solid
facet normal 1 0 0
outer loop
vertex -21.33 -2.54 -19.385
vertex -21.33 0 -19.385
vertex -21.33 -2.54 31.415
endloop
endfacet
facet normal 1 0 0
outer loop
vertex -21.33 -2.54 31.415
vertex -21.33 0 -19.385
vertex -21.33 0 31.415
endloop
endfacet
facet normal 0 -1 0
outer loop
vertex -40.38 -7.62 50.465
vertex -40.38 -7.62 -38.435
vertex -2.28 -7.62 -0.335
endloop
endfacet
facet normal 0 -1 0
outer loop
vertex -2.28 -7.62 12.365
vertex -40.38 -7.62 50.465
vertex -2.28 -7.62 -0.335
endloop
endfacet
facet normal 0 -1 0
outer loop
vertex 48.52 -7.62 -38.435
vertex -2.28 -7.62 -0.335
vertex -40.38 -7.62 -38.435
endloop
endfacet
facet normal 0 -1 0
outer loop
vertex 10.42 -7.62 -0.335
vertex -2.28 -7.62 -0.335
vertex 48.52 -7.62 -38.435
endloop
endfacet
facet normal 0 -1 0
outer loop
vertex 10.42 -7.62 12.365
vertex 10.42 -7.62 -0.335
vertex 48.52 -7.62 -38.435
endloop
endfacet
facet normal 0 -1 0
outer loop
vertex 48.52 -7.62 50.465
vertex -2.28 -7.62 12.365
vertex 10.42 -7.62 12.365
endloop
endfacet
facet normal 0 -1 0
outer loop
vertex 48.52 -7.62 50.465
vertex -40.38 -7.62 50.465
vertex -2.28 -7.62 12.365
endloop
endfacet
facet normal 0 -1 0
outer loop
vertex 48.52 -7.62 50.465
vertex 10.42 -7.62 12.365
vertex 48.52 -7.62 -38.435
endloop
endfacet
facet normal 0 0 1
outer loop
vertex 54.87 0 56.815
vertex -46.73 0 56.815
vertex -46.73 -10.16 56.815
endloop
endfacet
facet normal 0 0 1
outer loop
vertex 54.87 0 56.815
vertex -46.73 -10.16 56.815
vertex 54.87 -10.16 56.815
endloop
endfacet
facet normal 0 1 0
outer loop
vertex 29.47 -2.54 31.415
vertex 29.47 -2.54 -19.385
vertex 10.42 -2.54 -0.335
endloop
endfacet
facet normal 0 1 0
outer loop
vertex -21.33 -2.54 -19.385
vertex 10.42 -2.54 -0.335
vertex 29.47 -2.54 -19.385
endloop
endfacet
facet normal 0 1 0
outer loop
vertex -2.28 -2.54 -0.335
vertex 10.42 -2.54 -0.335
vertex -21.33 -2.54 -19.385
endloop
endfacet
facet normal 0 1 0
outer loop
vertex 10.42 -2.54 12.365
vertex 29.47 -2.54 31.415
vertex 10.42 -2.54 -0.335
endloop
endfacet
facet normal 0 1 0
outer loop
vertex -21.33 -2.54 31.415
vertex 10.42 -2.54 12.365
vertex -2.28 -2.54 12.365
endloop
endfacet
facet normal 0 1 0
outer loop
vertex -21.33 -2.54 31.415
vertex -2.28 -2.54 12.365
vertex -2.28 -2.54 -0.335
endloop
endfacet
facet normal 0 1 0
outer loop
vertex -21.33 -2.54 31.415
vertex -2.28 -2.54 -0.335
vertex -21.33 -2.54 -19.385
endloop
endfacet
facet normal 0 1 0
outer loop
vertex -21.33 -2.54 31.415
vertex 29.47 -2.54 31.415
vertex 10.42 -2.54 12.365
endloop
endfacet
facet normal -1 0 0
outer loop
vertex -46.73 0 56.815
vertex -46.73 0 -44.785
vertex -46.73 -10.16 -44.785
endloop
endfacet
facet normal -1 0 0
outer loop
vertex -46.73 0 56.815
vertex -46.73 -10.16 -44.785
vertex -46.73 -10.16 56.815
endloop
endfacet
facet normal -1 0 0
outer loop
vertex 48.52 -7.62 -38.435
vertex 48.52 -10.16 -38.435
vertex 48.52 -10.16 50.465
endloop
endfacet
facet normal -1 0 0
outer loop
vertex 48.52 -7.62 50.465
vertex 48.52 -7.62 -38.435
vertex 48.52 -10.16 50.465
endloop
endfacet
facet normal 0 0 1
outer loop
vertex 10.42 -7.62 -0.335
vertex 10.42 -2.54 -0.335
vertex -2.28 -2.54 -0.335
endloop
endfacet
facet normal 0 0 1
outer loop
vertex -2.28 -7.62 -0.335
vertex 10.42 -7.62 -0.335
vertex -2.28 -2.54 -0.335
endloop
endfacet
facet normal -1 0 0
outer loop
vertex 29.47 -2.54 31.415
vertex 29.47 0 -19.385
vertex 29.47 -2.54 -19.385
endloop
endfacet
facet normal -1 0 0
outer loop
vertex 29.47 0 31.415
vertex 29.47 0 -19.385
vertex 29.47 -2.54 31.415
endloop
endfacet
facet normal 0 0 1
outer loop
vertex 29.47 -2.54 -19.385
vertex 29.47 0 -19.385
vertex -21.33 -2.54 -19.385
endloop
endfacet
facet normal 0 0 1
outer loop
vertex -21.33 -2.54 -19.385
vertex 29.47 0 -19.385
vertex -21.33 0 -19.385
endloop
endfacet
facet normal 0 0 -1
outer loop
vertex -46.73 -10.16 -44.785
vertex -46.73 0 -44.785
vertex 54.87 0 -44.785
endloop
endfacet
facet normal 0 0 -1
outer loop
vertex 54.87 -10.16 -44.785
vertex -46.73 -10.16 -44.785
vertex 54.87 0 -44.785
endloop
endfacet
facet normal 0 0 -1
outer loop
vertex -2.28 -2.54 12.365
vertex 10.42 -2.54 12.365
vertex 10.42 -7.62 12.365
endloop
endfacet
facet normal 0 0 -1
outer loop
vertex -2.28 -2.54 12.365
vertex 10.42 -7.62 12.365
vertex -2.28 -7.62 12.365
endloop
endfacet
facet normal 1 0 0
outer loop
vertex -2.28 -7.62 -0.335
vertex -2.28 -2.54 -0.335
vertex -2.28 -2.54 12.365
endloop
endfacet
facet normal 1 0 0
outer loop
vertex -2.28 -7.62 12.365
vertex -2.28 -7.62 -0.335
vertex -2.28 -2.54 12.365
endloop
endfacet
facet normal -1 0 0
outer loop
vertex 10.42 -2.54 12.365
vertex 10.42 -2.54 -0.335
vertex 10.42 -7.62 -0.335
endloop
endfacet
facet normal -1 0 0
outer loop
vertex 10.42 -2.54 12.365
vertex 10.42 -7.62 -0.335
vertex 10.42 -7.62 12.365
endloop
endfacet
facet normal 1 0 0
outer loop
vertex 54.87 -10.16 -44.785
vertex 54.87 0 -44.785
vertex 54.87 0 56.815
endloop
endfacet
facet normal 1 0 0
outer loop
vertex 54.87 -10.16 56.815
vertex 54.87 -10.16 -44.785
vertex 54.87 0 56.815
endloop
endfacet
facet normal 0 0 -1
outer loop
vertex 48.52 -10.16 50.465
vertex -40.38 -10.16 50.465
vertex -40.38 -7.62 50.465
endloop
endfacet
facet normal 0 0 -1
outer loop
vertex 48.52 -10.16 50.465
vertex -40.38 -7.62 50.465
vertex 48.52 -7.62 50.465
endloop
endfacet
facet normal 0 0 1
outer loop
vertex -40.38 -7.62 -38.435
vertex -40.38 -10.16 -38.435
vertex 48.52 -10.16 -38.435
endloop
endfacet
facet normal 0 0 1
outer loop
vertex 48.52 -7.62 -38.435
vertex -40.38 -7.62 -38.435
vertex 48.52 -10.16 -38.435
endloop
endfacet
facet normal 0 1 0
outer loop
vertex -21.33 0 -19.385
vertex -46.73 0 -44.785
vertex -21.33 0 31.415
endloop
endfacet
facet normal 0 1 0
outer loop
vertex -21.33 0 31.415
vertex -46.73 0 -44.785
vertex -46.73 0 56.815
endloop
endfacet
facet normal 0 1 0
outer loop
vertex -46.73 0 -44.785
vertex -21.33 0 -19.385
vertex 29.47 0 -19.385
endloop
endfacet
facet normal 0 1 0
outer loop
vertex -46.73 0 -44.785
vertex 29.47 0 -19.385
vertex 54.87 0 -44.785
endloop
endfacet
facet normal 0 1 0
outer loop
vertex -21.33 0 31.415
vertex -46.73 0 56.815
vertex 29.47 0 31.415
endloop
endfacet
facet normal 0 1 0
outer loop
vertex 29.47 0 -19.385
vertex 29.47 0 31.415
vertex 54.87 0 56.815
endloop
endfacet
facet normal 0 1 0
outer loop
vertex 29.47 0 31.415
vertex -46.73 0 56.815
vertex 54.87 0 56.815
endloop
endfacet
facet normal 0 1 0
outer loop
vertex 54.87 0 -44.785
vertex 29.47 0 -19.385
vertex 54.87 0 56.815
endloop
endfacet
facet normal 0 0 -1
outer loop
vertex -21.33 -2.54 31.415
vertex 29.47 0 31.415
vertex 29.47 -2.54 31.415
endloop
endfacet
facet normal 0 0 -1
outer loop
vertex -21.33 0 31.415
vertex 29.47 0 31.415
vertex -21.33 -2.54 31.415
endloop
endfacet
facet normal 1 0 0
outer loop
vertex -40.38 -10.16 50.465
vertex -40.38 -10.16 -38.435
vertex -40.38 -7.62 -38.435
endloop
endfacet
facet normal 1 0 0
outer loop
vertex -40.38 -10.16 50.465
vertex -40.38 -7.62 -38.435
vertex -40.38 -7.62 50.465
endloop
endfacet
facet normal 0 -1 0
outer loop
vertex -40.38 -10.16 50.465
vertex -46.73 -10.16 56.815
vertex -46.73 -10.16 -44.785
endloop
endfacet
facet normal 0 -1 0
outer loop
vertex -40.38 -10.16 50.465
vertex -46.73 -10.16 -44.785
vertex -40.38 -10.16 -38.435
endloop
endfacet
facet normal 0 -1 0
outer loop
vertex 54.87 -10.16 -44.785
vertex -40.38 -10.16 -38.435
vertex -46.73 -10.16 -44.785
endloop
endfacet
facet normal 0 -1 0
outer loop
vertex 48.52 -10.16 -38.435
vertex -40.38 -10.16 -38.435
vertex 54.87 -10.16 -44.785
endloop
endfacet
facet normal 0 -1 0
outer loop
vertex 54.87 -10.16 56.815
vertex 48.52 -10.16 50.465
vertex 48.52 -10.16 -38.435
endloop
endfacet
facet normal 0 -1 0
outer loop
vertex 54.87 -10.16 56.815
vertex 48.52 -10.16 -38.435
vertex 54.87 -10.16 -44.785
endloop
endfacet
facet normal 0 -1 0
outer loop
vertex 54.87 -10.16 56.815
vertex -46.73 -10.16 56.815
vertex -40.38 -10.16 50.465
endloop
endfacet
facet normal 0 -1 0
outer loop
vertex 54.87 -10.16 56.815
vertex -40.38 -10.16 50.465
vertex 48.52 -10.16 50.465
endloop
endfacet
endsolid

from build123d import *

# Parameters (mm, degrees)
F0_W     = 101.6
F0_H     = 101.6
F1_DEPTH = 10.16
F2_W     = 88.9
F2_H     = 88.9
F3_DEPTH = 2.54
F4_W     = 50.8
F4_H     = 50.8
F5_DEPTH = 2.54
F6_W     = 12.7
F6_H     = 12.7
F7_DEPTH = 25.4


with BuildPart() as f1:
    # F0 (on Front) → F1 (new body)
    with BuildSketch(Plane.XZ):
        with Locations((4.06957, 6.01474)):
            Rectangle(F0_W, F0_H)
    extrude(amount=F1_DEPTH)

    # F2 (on face) → F3 (cut)
    with BuildSketch(Plane.XZ.offset(10.16)):
        with Locations((4.06957, 6.01474)):
            Rectangle(F2_W, F2_H)
    extrude(amount=-F3_DEPTH, mode=Mode.SUBTRACT)

    # F4 (on face) → F5 (cut)
    with BuildSketch(Plane(origin=(0, 0, 0), x_dir=(-1, 0, 0), z_dir=(0, 1, 0))):
        with Locations((-4.06957, 6.01474)):
            Rectangle(F4_W, F4_H)
    extrude(amount=-F5_DEPTH, mode=Mode.SUBTRACT)

    # F6 (on face) → F7 (cut)
    with BuildSketch(Plane(origin=(0, -2.54, 0), x_dir=(-1, 0, 0), z_dir=(0, 1, 0))):
        with Locations((-4.06957, 6.01474)):
            Rectangle(F6_W, F6_H)
    extrude(amount=-F7_DEPTH, mode=Mode.SUBTRACT)


solid = f1.part
